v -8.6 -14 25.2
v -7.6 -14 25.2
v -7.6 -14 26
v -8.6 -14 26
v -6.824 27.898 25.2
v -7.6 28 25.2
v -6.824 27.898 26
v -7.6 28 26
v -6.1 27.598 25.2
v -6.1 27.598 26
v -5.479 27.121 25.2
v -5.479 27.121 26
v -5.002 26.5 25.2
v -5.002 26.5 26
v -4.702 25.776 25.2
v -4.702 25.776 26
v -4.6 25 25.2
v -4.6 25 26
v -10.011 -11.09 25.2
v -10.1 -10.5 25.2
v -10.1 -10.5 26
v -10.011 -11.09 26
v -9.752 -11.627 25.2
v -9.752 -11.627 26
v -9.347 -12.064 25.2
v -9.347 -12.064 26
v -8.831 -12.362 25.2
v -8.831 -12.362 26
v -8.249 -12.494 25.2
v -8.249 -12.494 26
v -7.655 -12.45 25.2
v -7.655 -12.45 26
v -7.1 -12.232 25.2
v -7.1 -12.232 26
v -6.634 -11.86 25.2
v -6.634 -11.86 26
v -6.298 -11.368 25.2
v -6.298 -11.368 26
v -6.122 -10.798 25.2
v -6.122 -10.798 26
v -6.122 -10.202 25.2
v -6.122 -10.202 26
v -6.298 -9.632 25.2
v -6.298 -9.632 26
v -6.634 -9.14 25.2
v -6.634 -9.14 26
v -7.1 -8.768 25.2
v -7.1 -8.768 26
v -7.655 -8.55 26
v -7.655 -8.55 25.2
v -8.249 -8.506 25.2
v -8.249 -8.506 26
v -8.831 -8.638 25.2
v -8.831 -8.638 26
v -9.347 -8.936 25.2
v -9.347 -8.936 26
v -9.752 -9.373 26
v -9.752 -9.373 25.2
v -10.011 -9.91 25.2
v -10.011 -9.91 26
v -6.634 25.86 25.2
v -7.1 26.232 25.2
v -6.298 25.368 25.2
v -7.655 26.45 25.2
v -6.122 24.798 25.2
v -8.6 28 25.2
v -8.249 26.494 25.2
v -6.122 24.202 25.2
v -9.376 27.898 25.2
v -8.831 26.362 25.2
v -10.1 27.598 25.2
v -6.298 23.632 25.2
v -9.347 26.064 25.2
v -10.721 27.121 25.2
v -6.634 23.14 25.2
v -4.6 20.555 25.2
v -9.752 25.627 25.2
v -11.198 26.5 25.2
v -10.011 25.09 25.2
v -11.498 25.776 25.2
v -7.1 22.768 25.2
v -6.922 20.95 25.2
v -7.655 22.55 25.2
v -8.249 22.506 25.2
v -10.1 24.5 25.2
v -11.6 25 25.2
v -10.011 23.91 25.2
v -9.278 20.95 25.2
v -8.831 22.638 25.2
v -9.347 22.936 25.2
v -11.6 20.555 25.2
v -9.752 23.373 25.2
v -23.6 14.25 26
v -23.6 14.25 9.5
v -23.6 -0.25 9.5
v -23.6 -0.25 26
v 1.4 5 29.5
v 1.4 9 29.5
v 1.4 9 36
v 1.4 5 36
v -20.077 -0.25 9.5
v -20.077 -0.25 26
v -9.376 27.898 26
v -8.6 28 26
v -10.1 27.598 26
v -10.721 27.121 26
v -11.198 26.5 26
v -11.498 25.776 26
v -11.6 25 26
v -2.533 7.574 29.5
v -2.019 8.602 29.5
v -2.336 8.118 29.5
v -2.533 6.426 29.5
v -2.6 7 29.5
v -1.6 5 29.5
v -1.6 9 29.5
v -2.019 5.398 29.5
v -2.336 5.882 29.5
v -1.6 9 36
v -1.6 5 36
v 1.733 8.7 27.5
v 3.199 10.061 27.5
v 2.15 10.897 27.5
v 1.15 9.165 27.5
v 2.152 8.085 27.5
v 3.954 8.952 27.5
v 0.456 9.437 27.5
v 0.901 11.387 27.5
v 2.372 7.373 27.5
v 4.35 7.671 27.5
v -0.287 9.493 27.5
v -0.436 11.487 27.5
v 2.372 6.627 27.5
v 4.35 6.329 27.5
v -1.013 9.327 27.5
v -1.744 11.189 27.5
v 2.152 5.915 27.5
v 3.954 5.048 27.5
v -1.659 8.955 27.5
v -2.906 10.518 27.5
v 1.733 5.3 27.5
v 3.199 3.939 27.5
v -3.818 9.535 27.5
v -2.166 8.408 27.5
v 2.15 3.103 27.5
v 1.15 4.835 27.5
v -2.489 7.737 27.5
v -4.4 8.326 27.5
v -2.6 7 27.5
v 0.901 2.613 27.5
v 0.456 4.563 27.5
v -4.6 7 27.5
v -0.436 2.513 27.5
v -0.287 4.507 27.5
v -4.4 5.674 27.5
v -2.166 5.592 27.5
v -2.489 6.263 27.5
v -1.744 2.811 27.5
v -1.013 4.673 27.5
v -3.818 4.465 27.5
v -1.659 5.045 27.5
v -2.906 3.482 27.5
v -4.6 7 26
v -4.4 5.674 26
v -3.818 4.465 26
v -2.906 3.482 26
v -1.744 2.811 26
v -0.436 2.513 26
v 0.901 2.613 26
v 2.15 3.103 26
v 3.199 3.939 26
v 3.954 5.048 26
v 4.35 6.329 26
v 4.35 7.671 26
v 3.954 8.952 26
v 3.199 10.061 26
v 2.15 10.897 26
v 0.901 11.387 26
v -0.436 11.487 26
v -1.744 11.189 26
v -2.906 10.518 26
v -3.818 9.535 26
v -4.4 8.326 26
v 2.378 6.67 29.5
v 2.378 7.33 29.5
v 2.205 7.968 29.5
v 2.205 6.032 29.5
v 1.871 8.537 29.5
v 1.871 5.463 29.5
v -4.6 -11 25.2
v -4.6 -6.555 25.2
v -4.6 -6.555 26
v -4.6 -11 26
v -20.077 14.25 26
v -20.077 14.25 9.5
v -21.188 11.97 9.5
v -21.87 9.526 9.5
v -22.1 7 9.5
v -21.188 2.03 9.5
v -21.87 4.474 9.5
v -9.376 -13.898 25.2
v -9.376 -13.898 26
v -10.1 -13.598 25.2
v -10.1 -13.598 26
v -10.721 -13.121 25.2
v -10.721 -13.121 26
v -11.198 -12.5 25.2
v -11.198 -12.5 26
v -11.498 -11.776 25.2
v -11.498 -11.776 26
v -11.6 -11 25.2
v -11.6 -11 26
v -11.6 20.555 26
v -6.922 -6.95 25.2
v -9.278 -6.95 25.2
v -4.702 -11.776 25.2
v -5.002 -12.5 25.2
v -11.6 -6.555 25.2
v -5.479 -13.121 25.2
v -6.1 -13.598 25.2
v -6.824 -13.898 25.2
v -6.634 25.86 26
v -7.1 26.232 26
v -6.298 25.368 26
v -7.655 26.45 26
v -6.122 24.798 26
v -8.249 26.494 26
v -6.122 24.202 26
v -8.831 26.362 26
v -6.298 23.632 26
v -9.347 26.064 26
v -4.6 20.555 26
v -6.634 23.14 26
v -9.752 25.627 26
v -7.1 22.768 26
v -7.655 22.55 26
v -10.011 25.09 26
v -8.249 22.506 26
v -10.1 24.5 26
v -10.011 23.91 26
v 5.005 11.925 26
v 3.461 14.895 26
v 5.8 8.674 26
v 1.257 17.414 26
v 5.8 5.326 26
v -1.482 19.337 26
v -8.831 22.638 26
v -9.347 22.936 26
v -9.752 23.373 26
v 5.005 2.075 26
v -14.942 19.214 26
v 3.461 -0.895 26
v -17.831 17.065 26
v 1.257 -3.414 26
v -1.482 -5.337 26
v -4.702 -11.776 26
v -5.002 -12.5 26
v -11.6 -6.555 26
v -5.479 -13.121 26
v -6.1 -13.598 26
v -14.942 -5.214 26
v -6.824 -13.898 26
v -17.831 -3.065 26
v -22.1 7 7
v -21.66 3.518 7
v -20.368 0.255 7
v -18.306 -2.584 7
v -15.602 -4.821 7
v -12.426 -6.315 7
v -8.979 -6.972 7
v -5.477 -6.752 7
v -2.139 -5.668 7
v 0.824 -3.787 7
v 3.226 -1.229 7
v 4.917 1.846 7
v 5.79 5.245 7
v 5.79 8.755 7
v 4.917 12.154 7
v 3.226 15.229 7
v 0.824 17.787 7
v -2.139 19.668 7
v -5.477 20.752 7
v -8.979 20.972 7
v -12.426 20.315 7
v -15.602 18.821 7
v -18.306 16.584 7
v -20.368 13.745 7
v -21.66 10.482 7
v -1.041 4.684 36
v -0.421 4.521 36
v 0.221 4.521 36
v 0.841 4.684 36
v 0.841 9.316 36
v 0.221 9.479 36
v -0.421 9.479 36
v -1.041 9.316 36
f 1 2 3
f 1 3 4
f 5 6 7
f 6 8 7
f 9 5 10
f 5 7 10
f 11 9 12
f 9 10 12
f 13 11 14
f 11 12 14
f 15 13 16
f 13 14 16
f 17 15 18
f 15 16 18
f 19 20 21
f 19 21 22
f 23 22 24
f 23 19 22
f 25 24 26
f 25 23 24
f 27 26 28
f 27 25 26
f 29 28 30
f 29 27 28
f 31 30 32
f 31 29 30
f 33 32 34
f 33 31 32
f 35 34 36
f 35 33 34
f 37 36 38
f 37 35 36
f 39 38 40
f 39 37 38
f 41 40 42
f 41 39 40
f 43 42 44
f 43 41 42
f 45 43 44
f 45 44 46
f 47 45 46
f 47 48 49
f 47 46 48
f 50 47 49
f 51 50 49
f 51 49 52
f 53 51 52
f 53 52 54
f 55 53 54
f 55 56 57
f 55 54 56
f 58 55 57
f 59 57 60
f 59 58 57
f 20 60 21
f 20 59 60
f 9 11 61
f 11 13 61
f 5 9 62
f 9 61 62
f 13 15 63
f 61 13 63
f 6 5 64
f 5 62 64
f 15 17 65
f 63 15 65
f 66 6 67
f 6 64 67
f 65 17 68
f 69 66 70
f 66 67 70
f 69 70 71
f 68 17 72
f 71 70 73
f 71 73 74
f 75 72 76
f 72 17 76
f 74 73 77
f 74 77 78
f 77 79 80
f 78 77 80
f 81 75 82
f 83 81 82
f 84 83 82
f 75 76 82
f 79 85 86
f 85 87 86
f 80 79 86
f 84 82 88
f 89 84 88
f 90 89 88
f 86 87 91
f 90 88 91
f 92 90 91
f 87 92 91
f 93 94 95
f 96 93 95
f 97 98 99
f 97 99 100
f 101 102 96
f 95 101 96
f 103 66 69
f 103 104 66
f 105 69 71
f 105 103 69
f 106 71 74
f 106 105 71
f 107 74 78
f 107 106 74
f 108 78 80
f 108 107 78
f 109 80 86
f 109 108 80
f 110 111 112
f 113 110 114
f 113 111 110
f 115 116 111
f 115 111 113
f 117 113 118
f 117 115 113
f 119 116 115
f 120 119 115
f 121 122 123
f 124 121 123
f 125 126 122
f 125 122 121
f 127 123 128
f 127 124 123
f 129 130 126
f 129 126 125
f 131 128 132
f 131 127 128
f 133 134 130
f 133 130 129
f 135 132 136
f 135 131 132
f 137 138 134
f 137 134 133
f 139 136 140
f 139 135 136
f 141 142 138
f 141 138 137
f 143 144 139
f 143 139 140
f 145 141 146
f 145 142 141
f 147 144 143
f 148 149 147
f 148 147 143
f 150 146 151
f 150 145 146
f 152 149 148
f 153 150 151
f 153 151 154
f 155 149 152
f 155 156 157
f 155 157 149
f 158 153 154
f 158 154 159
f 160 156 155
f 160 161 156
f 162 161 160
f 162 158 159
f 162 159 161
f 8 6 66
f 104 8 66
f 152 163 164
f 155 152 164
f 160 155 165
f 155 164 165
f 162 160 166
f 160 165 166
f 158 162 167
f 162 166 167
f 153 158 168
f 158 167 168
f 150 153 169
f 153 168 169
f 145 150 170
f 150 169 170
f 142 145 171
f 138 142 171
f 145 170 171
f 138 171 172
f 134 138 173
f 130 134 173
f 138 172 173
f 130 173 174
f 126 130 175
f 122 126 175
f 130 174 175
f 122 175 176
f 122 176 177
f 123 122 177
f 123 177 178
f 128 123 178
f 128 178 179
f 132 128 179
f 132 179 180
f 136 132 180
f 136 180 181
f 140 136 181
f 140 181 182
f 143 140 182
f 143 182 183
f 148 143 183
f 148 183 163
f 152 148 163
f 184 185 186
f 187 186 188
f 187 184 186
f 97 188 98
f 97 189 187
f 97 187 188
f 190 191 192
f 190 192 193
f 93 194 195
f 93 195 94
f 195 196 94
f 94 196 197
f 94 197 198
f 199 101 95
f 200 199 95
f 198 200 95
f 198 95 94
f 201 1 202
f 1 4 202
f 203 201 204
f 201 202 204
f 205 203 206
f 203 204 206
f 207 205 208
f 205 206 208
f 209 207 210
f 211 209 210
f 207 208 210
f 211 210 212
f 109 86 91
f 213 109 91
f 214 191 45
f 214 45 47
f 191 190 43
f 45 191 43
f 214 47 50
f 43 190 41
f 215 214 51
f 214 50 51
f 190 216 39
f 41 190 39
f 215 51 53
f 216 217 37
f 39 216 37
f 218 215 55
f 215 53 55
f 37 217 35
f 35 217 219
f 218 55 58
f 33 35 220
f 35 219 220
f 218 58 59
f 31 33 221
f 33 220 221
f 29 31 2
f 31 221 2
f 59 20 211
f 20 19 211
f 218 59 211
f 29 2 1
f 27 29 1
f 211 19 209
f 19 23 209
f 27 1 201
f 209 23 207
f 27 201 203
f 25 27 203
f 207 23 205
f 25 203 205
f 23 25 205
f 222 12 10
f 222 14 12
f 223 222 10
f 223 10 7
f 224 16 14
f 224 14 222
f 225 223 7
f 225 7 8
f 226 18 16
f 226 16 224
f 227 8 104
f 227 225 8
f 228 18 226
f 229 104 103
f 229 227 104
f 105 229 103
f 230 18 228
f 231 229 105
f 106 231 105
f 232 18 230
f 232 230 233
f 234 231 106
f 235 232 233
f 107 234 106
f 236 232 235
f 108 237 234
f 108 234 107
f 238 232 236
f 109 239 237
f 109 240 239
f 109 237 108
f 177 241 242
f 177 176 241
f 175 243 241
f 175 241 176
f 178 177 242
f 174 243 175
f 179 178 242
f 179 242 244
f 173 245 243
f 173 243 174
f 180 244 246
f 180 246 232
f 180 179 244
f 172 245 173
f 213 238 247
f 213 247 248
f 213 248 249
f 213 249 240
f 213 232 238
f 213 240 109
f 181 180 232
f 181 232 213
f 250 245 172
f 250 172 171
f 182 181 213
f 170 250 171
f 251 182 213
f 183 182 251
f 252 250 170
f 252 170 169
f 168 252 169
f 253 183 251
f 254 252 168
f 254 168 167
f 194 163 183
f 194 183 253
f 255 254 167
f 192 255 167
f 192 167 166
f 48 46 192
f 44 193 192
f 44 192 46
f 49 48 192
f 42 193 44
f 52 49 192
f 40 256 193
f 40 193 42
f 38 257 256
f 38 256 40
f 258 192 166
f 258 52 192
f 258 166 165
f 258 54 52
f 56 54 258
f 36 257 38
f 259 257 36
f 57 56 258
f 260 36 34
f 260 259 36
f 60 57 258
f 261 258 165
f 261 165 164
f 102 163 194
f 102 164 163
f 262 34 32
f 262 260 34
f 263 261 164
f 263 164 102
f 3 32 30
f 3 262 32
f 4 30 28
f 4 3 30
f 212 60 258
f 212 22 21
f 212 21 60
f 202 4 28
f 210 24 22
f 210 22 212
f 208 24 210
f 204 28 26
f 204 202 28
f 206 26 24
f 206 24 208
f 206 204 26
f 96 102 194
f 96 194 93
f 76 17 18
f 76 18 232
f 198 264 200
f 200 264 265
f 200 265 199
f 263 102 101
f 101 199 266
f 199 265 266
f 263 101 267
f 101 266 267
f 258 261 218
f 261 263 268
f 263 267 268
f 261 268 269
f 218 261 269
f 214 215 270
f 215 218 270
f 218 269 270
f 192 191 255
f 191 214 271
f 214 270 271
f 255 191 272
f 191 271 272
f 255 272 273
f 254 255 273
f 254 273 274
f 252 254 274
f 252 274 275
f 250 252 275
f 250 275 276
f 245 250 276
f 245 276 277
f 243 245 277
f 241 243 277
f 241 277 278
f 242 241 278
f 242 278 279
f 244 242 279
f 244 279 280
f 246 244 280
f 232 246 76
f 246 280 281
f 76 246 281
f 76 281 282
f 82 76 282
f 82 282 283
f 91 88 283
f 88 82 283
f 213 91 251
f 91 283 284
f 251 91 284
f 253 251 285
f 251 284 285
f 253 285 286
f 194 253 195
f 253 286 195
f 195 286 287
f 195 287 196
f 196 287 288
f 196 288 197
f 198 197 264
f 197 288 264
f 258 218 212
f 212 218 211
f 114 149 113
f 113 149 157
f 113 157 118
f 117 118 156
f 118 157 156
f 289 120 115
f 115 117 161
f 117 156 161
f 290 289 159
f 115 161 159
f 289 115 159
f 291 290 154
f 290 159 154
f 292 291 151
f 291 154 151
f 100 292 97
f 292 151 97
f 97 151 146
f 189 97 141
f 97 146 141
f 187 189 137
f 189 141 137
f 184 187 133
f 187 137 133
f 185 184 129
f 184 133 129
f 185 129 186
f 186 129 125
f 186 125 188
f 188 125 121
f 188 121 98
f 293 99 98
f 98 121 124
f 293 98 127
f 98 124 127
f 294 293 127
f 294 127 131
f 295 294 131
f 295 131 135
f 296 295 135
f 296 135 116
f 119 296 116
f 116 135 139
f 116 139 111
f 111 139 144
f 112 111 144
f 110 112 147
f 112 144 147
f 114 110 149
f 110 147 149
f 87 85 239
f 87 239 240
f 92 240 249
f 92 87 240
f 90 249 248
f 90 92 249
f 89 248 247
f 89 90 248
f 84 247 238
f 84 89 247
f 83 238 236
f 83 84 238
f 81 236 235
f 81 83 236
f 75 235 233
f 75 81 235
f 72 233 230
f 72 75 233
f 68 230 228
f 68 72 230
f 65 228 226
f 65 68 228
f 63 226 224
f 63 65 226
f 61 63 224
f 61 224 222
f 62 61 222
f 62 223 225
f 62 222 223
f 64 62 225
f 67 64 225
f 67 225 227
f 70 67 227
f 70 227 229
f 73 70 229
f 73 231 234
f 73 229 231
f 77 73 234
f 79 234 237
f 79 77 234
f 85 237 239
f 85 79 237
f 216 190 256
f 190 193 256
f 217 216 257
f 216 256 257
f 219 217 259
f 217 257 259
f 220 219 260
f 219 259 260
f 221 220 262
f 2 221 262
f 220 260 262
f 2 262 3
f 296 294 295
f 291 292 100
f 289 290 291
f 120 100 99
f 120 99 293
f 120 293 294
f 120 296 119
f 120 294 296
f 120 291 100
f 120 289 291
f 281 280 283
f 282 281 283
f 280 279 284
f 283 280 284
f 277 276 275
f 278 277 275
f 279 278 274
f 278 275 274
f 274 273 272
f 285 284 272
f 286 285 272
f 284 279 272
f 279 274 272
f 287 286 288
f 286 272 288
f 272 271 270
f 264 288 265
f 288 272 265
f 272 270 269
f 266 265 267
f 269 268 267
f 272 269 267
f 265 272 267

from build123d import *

# Parameters (mm, degrees)
CYLINDER012_R             = 2
CYLINDER012_DEPTH         = 20
CYLINDER011_R             = 2
CYLINDER011_DEPTH         = 20
CYLINDER014_R             = 4.5
CYLINDER014_DEPTH         = 19.5
BOX009_W                  = 7
BOX009_H                  = 42
BOX009_DEPTH              = 0.8
FILLET008_R               = 3
FILLET009_R               = 3
FILLET010_R               = 3
FILLET011_R               = 3
BOX008_W                  = 10
BOX008_H                  = 14.5
BOX008_DEPTH              = 16.5
CYLINDER010_R             = 14
CYLINDER010_DEPTH         = 19
BOX010_W                  = 10
BOX010_H                  = 10
BOX010_DEPTH              = 10
BOX011_W                  = 10
BOX011_H                  = 10
BOX011_DEPTH              = 10
CYLINDER013_R             = 2.5
CYLINDER013_DEPTH         = 28
FUSION011_PLACEMENT_ANGLE = 180


with BuildPart() as cylinder012:
    # Cylinder012 → Cylinder012 (new body)
    with BuildSketch(Plane(origin=(0, -17.5, 14), x_dir=(1, 0, 0), z_dir=(0, 0, 1))):
        Circle(CYLINDER012_R)
    extrude(amount=CYLINDER012_DEPTH)


with BuildPart() as cylinder011:
    # Cylinder011 → Cylinder011 (new body)
    with BuildSketch(Plane(origin=(0, 17.5, 14), x_dir=(1, 0, 0), z_dir=(0, 0, 1))):
        Circle(CYLINDER011_R)
    extrude(amount=CYLINDER011_DEPTH)


with BuildPart() as shaft_boss002:
    # Cylinder014 → Cylinder014 (new body)
    with BuildSketch(Plane(origin=(-8, 0, 1), x_dir=(1, 0, 0), z_dir=(0, 0, 1))):
        Circle(CYLINDER014_R)
    extrude(amount=CYLINDER014_DEPTH)


with BuildPart() as fillet011:
    # Box009 → Box009 (new body)
    with BuildSketch(Plane(origin=(-3.5, -21, 18.2), x_dir=(1, 0, 0), z_dir=(0, 0, 1))):
        with Locations((3.5, 21)):
            Rectangle(BOX009_W, BOX009_H)
    extrude(amount=BOX009_DEPTH)

    # Fillet008
    fillet008_edges = [fillet011.edges().sort_by_distance(p)[0] for p in [
        (3.5, -21, 18.6),
    ]]
    fillet(fillet008_edges, radius=FILLET008_R)

    # Fillet009
    fillet009_edges = [fillet011.edges().sort_by_distance(p)[0] for p in [
        (-3.5, -21, 18.6),
    ]]
    fillet(fillet009_edges, radius=FILLET009_R)

    # Fillet010
    fillet010_edges = [fillet011.edges().sort_by_distance(p)[0] for p in [
        (-3.5, 21, 18.6),
    ]]
    fillet(fillet010_edges, radius=FILLET010_R)

    # Fillet011
    fillet011_edges = [fillet011.edges().sort_by_distance(p)[0] for p in [
        (3.5, 21, 18.6),
    ]]
    fillet(fillet011_edges, radius=FILLET011_R)


with BuildPart() as cube008:
    # Box008 → Box008 (new body)
    with BuildSketch(Plane(origin=(5.5, -7.25, 2.5), x_dir=(1, 0, 0), z_dir=(0, 0, 1))):
        with Locations((5, 7.25)):
            Rectangle(BOX008_W, BOX008_H)
    extrude(amount=BOX008_DEPTH)


with BuildPart() as motor_body002:
    # Cylinder010 → Cylinder010 (new body)
    with BuildSketch(Plane.XY):
        Circle(CYLINDER010_R)
    extrude(amount=CYLINDER010_DEPTH)

    # Fusion008: union Cube008
    add(cube008.part)

    # Fusion009: union Fillet011
    add(fillet011.part)

    # Fusion010: union shaft-boss002
    add(shaft_boss002.part)

    # Cut010: cut Cylinder011
    add(cylinder011.part, mode=Mode.SUBTRACT)

    # Cut011: cut Cylinder012
    add(cylinder012.part, mode=Mode.SUBTRACT)


with BuildPart() as cube010:
    # Box010 → Box010 (new body)
    with BuildSketch(Plane(origin=(-6.5, -5, 22.5), x_dir=(1, 0, 0), z_dir=(0, 0, 1))):
        with Locations((5, 5)):
            Rectangle(BOX010_W, BOX010_H)
    extrude(amount=BOX010_DEPTH)


with BuildPart() as cube011:
    # Box011 → Box011 (new body)
    with BuildSketch(Plane(origin=(-19.5, -5, 22.5), x_dir=(1, 0, 0), z_dir=(0, 0, 1))):
        with Locations((5, 5)):
            Rectangle(BOX011_W, BOX011_H)
    extrude(amount=BOX011_DEPTH)


with BuildPart() as f_28byj_48_motor002:
    # Cylinder013 → Cylinder013 (new body)
    with BuildSketch(Plane(origin=(-8, 0, 1), x_dir=(1, 0, 0), z_dir=(0, 0, 1))):
        Circle(CYLINDER013_R)
    extrude(amount=CYLINDER013_DEPTH)

    # Cut008: cut Cube011
    add(cube011.part, mode=Mode.SUBTRACT)

    # Cut009: cut Cube010
    add(cube010.part, mode=Mode.SUBTRACT)

    # Fusion011: union motor-body002
    add(motor_body002.part)


with BuildPart() as f_28byj_48_motor002_1:
    # Fusion011 placement: moved
    add(f_28byj_48_motor002.part.moved(Location((-8.1, 7, 7))).rotate(Axis((-8.1, 7, 7), (0, 0, 1)), FUSION011_PLACEMENT_ANGLE))


solid = f_28byj_48_motor002_1.part
